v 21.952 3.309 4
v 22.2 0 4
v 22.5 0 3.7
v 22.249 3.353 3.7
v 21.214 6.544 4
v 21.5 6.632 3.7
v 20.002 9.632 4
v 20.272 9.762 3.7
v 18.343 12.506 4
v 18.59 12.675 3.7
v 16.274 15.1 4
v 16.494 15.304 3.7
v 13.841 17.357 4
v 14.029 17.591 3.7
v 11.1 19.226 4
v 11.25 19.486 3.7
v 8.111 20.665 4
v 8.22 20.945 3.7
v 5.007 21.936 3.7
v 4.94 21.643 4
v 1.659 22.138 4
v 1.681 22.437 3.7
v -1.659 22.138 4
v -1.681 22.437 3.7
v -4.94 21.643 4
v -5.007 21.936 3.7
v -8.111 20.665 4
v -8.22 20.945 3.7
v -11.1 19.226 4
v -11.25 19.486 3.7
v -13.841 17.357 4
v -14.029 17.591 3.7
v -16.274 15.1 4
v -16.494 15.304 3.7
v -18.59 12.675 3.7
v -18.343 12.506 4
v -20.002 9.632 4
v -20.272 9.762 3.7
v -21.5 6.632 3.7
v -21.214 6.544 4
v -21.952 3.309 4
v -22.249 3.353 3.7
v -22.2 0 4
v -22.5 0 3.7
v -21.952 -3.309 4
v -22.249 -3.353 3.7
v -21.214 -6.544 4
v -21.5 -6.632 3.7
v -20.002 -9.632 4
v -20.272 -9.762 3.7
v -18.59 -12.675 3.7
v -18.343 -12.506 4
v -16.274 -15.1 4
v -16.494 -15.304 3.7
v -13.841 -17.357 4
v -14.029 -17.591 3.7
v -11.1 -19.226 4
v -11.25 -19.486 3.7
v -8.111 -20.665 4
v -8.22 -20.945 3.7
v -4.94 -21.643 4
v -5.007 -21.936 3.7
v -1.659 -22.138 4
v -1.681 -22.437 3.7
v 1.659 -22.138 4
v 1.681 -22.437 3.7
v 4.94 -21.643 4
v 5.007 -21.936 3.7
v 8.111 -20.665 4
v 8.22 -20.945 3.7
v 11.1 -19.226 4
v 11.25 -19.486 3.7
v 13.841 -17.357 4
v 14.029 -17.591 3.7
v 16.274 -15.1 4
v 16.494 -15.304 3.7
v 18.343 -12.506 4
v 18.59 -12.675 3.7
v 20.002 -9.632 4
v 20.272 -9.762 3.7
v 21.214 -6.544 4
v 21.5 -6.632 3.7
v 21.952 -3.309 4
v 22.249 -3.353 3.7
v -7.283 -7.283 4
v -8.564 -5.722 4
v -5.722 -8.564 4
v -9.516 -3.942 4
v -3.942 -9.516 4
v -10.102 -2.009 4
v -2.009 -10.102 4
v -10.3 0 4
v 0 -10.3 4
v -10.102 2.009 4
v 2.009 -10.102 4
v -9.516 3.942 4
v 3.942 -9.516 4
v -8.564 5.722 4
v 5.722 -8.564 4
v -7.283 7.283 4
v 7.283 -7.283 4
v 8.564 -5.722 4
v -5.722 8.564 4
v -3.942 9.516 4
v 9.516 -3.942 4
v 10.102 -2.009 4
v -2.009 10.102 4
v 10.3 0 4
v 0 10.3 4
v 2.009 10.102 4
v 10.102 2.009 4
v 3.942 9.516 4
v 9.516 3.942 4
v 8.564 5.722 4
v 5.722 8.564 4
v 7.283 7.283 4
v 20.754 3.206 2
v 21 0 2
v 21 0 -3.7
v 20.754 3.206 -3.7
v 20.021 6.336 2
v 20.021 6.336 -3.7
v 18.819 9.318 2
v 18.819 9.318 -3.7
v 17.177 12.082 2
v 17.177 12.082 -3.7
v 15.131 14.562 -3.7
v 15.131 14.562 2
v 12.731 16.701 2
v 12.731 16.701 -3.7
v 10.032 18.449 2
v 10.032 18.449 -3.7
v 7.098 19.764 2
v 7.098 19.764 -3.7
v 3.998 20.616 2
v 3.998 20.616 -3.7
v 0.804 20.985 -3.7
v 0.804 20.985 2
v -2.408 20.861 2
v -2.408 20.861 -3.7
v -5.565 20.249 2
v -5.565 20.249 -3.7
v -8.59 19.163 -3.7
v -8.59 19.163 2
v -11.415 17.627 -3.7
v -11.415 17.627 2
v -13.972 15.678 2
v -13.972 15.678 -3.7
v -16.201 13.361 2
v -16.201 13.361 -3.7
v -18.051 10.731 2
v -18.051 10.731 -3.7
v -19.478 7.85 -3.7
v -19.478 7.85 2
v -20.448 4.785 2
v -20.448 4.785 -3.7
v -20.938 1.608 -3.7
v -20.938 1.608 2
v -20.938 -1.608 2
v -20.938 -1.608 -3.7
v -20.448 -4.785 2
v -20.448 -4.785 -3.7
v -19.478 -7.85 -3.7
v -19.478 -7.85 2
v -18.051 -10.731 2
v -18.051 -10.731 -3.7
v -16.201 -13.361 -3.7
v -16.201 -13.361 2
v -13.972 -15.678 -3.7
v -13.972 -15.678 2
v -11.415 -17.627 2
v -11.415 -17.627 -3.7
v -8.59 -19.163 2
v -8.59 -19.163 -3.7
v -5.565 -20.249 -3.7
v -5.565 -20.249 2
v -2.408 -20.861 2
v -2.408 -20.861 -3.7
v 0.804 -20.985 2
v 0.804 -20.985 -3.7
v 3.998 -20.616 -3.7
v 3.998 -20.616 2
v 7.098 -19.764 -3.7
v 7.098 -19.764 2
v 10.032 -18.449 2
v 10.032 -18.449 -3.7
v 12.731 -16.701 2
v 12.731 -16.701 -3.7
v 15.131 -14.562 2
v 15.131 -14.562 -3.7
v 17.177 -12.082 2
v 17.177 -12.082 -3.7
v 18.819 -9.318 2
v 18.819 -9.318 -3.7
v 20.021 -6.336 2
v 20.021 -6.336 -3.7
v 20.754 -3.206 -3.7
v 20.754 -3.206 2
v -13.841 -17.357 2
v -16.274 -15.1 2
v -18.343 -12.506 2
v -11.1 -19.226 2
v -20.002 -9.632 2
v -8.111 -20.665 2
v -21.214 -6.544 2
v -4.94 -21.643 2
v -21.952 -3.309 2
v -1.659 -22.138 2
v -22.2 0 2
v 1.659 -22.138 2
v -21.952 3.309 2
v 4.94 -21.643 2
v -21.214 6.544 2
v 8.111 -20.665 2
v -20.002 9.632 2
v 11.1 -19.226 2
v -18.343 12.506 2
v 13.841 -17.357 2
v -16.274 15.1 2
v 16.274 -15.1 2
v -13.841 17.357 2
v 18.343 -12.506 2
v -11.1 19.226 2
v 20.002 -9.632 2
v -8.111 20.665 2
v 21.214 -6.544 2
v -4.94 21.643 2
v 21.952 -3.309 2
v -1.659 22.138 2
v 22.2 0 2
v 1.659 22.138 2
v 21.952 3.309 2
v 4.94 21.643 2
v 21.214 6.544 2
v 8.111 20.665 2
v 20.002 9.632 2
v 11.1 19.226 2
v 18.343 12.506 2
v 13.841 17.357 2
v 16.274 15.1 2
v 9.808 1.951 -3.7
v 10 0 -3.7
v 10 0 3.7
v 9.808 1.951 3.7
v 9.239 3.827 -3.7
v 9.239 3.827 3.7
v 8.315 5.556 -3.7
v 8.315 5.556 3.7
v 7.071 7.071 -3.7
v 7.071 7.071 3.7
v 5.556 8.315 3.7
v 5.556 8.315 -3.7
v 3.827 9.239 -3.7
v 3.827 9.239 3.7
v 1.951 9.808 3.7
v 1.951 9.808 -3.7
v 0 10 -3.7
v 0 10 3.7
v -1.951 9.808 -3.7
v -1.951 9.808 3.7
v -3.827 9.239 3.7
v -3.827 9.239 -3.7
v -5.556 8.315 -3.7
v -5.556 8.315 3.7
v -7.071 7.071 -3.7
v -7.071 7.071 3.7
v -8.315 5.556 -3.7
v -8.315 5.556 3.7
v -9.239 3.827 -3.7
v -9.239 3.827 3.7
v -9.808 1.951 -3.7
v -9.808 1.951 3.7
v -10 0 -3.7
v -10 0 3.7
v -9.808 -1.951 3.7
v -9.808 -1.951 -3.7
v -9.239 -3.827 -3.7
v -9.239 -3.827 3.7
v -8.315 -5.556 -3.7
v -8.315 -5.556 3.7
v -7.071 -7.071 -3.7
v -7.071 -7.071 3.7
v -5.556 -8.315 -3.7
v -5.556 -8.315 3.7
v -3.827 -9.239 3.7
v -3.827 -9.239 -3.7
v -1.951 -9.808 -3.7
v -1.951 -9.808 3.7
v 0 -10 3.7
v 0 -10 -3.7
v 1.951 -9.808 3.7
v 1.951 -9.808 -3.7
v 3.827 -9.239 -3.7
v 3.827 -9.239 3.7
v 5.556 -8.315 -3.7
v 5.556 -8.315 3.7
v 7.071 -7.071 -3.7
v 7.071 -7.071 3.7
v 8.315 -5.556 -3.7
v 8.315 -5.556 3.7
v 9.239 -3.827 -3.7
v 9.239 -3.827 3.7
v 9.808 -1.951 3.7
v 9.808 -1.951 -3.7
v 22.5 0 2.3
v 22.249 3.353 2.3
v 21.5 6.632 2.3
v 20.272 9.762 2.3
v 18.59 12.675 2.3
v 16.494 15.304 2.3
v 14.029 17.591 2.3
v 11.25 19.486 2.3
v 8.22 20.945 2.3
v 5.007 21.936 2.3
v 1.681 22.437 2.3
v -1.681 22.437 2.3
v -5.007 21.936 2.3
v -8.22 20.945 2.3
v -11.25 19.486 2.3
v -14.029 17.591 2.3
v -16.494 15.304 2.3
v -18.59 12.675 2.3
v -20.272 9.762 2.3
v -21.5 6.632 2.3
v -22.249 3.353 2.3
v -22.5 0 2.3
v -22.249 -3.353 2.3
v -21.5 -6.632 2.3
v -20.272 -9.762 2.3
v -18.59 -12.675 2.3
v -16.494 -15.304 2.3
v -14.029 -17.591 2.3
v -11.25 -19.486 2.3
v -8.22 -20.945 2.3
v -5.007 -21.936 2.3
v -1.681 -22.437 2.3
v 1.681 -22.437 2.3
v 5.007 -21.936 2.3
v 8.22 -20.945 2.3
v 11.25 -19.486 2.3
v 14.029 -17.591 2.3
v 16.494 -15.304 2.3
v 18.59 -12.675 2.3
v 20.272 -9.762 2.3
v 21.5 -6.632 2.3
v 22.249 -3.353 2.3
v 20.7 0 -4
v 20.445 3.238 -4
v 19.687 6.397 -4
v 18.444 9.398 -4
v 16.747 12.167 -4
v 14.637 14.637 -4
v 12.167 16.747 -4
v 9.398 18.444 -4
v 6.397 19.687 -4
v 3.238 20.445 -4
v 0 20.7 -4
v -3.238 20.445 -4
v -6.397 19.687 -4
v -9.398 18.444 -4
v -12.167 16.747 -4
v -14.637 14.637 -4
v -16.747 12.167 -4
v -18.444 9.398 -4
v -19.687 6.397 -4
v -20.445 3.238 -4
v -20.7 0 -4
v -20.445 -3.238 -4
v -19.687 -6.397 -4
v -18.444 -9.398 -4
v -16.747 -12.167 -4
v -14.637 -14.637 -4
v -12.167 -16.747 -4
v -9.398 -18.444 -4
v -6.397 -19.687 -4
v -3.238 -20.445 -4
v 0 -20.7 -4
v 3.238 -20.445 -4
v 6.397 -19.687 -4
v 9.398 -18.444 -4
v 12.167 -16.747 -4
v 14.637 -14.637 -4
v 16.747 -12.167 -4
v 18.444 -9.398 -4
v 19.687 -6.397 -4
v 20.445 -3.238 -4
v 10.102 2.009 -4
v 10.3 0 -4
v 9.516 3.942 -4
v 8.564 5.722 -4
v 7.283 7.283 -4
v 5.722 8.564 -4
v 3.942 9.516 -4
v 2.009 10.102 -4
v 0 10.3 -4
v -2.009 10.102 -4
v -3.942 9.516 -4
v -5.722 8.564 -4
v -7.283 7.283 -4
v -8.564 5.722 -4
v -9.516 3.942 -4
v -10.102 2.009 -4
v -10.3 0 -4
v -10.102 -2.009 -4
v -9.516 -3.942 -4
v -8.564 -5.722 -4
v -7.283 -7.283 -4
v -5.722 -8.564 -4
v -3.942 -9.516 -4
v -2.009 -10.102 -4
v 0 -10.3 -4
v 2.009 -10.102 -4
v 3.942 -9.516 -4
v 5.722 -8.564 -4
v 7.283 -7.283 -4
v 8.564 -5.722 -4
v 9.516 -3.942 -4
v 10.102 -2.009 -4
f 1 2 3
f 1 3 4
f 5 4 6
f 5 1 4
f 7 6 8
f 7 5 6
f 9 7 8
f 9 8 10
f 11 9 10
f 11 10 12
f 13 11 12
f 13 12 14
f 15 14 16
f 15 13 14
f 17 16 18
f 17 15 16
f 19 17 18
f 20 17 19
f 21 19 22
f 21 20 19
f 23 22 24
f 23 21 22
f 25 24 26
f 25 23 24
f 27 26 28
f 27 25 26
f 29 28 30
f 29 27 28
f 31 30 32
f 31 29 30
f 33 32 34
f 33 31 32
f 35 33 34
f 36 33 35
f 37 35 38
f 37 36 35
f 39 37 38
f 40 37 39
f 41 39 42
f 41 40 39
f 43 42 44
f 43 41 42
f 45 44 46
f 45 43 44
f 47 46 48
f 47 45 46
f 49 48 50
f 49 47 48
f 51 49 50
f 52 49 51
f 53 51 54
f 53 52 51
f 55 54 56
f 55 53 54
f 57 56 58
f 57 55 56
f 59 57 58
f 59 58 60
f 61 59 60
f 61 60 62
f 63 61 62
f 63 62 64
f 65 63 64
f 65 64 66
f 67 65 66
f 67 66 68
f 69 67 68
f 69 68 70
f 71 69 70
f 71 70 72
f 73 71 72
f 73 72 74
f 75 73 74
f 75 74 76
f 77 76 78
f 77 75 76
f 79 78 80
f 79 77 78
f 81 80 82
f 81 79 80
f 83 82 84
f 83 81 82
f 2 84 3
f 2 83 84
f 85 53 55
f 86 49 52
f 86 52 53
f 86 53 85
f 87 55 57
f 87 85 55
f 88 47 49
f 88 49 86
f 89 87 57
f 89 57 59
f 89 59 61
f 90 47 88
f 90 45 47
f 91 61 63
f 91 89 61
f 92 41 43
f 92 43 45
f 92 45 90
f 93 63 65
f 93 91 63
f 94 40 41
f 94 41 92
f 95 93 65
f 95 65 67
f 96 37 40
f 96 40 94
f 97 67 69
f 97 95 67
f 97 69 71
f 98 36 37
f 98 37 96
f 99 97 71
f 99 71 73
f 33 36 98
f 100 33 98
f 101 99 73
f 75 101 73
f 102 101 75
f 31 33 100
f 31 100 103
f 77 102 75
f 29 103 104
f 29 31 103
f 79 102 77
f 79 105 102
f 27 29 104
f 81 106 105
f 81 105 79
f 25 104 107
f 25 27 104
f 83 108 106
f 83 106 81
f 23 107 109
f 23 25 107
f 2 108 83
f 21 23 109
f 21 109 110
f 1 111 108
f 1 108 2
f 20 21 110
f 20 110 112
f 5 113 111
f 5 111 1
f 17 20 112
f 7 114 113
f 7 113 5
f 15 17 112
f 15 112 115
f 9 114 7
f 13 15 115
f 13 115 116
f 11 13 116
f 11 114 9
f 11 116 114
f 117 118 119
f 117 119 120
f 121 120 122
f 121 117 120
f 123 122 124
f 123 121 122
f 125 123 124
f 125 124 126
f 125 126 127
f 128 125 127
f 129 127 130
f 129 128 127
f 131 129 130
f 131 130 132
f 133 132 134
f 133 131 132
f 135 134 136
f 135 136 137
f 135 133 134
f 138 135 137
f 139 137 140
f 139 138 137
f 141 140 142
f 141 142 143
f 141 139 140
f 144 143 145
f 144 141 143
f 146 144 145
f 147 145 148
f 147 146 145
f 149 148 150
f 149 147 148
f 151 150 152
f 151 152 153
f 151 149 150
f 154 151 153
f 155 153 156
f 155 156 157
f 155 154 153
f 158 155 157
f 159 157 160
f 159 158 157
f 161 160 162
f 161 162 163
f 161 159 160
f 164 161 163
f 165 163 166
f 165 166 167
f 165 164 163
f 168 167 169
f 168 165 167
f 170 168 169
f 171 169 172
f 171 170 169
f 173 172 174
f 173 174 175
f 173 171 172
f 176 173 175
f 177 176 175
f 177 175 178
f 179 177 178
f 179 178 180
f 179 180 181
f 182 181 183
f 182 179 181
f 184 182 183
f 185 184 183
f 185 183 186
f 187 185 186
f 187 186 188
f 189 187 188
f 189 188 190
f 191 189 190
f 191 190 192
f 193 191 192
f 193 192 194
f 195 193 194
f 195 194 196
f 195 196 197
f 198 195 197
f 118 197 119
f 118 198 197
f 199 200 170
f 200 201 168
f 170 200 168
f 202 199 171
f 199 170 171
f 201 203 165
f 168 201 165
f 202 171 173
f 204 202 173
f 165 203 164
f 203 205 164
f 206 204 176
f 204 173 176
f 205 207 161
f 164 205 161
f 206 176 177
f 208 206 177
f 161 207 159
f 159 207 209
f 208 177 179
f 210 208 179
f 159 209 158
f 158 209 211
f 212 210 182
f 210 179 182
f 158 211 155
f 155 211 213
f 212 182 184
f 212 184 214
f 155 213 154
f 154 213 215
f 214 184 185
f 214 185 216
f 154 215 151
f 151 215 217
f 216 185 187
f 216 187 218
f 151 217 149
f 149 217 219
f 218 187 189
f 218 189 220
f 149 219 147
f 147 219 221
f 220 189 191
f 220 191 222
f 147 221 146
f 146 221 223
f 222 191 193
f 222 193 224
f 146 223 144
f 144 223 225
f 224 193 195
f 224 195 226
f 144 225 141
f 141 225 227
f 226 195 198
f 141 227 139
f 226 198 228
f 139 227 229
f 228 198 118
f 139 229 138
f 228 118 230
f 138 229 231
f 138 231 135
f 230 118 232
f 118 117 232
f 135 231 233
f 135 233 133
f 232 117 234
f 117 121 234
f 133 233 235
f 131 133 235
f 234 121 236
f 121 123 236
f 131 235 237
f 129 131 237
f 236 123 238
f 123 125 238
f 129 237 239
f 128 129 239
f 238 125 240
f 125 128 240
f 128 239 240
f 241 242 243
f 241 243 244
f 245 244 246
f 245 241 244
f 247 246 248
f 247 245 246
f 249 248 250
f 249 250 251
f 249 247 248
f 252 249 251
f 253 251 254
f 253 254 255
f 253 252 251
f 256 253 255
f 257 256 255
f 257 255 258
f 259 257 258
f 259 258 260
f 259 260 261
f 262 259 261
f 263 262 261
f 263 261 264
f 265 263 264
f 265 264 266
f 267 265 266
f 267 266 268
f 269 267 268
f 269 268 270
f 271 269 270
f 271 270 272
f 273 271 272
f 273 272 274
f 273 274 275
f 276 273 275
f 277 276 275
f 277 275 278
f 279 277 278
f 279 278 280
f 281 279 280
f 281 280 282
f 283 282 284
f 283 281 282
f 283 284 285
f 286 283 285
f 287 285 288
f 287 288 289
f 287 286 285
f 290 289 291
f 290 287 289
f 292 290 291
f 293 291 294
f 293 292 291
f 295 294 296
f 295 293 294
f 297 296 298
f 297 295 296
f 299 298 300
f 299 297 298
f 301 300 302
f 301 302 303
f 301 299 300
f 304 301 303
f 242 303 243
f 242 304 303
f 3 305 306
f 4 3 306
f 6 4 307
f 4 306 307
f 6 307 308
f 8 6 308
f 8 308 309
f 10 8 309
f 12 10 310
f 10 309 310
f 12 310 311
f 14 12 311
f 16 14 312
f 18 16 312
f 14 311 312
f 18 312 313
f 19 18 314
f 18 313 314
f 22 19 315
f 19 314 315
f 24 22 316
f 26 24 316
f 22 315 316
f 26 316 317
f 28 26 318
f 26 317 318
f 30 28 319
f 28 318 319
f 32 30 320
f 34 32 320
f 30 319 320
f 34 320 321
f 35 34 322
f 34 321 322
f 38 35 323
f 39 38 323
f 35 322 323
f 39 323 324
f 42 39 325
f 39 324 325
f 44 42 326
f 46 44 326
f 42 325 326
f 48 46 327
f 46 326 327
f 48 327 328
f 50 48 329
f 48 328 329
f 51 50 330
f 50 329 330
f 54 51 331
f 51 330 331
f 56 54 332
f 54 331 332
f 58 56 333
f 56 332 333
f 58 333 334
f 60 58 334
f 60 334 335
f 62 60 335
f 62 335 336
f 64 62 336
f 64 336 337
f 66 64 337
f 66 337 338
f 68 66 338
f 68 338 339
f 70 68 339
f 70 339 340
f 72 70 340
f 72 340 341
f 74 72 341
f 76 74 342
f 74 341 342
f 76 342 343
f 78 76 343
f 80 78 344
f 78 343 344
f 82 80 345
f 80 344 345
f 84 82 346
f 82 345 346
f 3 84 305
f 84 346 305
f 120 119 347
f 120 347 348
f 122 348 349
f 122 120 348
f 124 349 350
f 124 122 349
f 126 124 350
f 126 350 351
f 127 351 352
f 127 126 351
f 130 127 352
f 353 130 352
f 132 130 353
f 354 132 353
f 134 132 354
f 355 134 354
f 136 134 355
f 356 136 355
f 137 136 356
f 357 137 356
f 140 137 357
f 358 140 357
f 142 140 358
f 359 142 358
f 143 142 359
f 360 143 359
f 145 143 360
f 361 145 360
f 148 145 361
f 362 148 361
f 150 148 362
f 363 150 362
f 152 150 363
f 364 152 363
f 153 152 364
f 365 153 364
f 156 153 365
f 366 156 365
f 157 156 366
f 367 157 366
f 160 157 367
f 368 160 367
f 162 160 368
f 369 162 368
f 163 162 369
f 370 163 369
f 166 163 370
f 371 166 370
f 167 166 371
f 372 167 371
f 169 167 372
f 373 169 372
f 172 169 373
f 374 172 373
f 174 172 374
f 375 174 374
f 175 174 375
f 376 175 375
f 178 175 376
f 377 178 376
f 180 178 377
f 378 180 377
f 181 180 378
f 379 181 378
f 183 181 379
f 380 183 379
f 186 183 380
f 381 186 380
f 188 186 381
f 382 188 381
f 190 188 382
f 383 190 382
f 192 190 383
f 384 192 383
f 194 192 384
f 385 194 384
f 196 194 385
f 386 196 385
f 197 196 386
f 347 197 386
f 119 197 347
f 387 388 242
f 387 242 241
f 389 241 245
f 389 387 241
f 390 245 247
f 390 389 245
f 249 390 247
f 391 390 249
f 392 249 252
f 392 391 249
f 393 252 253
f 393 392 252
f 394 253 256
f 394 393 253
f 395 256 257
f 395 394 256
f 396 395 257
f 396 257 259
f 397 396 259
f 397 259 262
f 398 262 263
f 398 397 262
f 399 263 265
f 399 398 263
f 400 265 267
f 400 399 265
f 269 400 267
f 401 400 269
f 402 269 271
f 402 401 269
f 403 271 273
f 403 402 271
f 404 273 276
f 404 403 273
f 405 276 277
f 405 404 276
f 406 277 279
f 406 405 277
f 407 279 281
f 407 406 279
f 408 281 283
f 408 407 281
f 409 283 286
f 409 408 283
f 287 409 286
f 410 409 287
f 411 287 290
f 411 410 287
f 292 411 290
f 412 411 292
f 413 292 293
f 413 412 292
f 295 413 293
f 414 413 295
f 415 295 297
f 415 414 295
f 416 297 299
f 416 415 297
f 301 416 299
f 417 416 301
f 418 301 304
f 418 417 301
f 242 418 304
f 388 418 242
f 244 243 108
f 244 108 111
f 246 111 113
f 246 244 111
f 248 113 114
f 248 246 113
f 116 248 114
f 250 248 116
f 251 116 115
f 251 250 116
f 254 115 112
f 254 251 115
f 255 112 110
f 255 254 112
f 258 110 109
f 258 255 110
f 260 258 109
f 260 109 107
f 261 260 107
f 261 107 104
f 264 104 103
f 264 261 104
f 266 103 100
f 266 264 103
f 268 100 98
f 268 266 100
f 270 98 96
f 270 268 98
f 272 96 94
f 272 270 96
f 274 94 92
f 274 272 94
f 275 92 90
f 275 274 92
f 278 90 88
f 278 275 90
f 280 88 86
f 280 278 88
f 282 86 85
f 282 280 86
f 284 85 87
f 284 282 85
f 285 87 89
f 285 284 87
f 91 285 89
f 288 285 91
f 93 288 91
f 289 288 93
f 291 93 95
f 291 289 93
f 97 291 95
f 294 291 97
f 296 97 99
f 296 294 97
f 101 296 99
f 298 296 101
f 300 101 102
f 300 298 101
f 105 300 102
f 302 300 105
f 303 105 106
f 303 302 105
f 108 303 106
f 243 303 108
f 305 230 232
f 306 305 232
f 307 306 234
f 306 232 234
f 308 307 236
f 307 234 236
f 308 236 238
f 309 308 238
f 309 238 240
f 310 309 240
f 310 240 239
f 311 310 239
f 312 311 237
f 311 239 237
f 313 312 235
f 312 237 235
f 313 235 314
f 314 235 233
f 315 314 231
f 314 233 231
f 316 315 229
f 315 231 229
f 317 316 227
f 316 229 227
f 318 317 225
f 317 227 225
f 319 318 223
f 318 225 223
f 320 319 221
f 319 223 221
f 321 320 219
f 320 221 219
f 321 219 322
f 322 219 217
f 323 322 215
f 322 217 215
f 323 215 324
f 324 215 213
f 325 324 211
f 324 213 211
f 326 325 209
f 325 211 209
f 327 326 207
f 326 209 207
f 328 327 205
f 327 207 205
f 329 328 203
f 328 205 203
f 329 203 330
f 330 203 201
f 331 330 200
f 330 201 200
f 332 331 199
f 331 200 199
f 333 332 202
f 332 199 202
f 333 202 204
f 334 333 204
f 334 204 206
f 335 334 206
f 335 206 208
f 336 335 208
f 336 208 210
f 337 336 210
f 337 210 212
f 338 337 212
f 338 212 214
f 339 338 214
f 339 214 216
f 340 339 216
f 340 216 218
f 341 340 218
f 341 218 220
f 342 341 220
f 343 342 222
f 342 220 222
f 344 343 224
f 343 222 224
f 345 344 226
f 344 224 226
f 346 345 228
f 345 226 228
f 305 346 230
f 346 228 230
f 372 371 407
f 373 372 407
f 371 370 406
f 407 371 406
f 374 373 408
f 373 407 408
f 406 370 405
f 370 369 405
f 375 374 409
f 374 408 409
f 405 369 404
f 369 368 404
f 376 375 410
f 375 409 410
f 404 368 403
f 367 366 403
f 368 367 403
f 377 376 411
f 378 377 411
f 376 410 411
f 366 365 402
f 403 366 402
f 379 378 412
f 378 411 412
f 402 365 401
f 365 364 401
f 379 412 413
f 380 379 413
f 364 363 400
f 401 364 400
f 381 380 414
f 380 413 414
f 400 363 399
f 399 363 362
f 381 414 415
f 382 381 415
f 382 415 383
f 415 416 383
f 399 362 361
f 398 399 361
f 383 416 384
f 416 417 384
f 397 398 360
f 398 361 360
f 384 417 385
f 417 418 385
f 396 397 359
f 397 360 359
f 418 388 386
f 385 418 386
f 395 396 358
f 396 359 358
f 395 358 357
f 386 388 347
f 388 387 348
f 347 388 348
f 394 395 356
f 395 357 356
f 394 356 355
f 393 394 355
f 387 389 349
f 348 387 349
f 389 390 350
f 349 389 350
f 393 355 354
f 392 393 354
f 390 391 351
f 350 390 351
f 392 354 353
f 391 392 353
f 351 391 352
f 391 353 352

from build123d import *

# Parameters (mm, degrees)
SKETCH_1_R      = 21
SKETCH_1_R_2    = 10
EXTRUDE_1_DEPTH = 4
EXTRUDE_START   = -2
SKETCH_2_R      = 22.5
SKETCH_2_R_2    = 10
EXTRUDE_2_DEPTH = 2
CHAMFER_1_SIZE  = 0.3


with BuildPart() as part:
    # 草图1 → 凸台-拉伸1 (new, symmetric)
    with BuildSketch(Plane.XY):
        Circle(SKETCH_1_R)
        Circle(SKETCH_1_R_2, mode=Mode.SUBTRACT)
    extrude(amount=EXTRUDE_1_DEPTH, both=True)

    # 草图2 → 凸台-拉伸2 (add)
    with BuildSketch(Plane.XY.offset(4).offset(EXTRUDE_START)):
        Circle(SKETCH_2_R)
        Circle(SKETCH_2_R_2, mode=Mode.SUBTRACT)
    extrude(amount=EXTRUDE_2_DEPTH)

    # 倒角1
    chamfer_1_edges = [part.edges().sort_by_distance(p)[0] for p in [
        (-22.5, 0, 4),
        (-22.5, 0, 2),
        (-21, 0, -4),
        (-10, 0, -4),
        (-10, 0, 4),
    ]]
    chamfer(chamfer_1_edges, length=CHAMFER_1_SIZE)


solid = part.part
